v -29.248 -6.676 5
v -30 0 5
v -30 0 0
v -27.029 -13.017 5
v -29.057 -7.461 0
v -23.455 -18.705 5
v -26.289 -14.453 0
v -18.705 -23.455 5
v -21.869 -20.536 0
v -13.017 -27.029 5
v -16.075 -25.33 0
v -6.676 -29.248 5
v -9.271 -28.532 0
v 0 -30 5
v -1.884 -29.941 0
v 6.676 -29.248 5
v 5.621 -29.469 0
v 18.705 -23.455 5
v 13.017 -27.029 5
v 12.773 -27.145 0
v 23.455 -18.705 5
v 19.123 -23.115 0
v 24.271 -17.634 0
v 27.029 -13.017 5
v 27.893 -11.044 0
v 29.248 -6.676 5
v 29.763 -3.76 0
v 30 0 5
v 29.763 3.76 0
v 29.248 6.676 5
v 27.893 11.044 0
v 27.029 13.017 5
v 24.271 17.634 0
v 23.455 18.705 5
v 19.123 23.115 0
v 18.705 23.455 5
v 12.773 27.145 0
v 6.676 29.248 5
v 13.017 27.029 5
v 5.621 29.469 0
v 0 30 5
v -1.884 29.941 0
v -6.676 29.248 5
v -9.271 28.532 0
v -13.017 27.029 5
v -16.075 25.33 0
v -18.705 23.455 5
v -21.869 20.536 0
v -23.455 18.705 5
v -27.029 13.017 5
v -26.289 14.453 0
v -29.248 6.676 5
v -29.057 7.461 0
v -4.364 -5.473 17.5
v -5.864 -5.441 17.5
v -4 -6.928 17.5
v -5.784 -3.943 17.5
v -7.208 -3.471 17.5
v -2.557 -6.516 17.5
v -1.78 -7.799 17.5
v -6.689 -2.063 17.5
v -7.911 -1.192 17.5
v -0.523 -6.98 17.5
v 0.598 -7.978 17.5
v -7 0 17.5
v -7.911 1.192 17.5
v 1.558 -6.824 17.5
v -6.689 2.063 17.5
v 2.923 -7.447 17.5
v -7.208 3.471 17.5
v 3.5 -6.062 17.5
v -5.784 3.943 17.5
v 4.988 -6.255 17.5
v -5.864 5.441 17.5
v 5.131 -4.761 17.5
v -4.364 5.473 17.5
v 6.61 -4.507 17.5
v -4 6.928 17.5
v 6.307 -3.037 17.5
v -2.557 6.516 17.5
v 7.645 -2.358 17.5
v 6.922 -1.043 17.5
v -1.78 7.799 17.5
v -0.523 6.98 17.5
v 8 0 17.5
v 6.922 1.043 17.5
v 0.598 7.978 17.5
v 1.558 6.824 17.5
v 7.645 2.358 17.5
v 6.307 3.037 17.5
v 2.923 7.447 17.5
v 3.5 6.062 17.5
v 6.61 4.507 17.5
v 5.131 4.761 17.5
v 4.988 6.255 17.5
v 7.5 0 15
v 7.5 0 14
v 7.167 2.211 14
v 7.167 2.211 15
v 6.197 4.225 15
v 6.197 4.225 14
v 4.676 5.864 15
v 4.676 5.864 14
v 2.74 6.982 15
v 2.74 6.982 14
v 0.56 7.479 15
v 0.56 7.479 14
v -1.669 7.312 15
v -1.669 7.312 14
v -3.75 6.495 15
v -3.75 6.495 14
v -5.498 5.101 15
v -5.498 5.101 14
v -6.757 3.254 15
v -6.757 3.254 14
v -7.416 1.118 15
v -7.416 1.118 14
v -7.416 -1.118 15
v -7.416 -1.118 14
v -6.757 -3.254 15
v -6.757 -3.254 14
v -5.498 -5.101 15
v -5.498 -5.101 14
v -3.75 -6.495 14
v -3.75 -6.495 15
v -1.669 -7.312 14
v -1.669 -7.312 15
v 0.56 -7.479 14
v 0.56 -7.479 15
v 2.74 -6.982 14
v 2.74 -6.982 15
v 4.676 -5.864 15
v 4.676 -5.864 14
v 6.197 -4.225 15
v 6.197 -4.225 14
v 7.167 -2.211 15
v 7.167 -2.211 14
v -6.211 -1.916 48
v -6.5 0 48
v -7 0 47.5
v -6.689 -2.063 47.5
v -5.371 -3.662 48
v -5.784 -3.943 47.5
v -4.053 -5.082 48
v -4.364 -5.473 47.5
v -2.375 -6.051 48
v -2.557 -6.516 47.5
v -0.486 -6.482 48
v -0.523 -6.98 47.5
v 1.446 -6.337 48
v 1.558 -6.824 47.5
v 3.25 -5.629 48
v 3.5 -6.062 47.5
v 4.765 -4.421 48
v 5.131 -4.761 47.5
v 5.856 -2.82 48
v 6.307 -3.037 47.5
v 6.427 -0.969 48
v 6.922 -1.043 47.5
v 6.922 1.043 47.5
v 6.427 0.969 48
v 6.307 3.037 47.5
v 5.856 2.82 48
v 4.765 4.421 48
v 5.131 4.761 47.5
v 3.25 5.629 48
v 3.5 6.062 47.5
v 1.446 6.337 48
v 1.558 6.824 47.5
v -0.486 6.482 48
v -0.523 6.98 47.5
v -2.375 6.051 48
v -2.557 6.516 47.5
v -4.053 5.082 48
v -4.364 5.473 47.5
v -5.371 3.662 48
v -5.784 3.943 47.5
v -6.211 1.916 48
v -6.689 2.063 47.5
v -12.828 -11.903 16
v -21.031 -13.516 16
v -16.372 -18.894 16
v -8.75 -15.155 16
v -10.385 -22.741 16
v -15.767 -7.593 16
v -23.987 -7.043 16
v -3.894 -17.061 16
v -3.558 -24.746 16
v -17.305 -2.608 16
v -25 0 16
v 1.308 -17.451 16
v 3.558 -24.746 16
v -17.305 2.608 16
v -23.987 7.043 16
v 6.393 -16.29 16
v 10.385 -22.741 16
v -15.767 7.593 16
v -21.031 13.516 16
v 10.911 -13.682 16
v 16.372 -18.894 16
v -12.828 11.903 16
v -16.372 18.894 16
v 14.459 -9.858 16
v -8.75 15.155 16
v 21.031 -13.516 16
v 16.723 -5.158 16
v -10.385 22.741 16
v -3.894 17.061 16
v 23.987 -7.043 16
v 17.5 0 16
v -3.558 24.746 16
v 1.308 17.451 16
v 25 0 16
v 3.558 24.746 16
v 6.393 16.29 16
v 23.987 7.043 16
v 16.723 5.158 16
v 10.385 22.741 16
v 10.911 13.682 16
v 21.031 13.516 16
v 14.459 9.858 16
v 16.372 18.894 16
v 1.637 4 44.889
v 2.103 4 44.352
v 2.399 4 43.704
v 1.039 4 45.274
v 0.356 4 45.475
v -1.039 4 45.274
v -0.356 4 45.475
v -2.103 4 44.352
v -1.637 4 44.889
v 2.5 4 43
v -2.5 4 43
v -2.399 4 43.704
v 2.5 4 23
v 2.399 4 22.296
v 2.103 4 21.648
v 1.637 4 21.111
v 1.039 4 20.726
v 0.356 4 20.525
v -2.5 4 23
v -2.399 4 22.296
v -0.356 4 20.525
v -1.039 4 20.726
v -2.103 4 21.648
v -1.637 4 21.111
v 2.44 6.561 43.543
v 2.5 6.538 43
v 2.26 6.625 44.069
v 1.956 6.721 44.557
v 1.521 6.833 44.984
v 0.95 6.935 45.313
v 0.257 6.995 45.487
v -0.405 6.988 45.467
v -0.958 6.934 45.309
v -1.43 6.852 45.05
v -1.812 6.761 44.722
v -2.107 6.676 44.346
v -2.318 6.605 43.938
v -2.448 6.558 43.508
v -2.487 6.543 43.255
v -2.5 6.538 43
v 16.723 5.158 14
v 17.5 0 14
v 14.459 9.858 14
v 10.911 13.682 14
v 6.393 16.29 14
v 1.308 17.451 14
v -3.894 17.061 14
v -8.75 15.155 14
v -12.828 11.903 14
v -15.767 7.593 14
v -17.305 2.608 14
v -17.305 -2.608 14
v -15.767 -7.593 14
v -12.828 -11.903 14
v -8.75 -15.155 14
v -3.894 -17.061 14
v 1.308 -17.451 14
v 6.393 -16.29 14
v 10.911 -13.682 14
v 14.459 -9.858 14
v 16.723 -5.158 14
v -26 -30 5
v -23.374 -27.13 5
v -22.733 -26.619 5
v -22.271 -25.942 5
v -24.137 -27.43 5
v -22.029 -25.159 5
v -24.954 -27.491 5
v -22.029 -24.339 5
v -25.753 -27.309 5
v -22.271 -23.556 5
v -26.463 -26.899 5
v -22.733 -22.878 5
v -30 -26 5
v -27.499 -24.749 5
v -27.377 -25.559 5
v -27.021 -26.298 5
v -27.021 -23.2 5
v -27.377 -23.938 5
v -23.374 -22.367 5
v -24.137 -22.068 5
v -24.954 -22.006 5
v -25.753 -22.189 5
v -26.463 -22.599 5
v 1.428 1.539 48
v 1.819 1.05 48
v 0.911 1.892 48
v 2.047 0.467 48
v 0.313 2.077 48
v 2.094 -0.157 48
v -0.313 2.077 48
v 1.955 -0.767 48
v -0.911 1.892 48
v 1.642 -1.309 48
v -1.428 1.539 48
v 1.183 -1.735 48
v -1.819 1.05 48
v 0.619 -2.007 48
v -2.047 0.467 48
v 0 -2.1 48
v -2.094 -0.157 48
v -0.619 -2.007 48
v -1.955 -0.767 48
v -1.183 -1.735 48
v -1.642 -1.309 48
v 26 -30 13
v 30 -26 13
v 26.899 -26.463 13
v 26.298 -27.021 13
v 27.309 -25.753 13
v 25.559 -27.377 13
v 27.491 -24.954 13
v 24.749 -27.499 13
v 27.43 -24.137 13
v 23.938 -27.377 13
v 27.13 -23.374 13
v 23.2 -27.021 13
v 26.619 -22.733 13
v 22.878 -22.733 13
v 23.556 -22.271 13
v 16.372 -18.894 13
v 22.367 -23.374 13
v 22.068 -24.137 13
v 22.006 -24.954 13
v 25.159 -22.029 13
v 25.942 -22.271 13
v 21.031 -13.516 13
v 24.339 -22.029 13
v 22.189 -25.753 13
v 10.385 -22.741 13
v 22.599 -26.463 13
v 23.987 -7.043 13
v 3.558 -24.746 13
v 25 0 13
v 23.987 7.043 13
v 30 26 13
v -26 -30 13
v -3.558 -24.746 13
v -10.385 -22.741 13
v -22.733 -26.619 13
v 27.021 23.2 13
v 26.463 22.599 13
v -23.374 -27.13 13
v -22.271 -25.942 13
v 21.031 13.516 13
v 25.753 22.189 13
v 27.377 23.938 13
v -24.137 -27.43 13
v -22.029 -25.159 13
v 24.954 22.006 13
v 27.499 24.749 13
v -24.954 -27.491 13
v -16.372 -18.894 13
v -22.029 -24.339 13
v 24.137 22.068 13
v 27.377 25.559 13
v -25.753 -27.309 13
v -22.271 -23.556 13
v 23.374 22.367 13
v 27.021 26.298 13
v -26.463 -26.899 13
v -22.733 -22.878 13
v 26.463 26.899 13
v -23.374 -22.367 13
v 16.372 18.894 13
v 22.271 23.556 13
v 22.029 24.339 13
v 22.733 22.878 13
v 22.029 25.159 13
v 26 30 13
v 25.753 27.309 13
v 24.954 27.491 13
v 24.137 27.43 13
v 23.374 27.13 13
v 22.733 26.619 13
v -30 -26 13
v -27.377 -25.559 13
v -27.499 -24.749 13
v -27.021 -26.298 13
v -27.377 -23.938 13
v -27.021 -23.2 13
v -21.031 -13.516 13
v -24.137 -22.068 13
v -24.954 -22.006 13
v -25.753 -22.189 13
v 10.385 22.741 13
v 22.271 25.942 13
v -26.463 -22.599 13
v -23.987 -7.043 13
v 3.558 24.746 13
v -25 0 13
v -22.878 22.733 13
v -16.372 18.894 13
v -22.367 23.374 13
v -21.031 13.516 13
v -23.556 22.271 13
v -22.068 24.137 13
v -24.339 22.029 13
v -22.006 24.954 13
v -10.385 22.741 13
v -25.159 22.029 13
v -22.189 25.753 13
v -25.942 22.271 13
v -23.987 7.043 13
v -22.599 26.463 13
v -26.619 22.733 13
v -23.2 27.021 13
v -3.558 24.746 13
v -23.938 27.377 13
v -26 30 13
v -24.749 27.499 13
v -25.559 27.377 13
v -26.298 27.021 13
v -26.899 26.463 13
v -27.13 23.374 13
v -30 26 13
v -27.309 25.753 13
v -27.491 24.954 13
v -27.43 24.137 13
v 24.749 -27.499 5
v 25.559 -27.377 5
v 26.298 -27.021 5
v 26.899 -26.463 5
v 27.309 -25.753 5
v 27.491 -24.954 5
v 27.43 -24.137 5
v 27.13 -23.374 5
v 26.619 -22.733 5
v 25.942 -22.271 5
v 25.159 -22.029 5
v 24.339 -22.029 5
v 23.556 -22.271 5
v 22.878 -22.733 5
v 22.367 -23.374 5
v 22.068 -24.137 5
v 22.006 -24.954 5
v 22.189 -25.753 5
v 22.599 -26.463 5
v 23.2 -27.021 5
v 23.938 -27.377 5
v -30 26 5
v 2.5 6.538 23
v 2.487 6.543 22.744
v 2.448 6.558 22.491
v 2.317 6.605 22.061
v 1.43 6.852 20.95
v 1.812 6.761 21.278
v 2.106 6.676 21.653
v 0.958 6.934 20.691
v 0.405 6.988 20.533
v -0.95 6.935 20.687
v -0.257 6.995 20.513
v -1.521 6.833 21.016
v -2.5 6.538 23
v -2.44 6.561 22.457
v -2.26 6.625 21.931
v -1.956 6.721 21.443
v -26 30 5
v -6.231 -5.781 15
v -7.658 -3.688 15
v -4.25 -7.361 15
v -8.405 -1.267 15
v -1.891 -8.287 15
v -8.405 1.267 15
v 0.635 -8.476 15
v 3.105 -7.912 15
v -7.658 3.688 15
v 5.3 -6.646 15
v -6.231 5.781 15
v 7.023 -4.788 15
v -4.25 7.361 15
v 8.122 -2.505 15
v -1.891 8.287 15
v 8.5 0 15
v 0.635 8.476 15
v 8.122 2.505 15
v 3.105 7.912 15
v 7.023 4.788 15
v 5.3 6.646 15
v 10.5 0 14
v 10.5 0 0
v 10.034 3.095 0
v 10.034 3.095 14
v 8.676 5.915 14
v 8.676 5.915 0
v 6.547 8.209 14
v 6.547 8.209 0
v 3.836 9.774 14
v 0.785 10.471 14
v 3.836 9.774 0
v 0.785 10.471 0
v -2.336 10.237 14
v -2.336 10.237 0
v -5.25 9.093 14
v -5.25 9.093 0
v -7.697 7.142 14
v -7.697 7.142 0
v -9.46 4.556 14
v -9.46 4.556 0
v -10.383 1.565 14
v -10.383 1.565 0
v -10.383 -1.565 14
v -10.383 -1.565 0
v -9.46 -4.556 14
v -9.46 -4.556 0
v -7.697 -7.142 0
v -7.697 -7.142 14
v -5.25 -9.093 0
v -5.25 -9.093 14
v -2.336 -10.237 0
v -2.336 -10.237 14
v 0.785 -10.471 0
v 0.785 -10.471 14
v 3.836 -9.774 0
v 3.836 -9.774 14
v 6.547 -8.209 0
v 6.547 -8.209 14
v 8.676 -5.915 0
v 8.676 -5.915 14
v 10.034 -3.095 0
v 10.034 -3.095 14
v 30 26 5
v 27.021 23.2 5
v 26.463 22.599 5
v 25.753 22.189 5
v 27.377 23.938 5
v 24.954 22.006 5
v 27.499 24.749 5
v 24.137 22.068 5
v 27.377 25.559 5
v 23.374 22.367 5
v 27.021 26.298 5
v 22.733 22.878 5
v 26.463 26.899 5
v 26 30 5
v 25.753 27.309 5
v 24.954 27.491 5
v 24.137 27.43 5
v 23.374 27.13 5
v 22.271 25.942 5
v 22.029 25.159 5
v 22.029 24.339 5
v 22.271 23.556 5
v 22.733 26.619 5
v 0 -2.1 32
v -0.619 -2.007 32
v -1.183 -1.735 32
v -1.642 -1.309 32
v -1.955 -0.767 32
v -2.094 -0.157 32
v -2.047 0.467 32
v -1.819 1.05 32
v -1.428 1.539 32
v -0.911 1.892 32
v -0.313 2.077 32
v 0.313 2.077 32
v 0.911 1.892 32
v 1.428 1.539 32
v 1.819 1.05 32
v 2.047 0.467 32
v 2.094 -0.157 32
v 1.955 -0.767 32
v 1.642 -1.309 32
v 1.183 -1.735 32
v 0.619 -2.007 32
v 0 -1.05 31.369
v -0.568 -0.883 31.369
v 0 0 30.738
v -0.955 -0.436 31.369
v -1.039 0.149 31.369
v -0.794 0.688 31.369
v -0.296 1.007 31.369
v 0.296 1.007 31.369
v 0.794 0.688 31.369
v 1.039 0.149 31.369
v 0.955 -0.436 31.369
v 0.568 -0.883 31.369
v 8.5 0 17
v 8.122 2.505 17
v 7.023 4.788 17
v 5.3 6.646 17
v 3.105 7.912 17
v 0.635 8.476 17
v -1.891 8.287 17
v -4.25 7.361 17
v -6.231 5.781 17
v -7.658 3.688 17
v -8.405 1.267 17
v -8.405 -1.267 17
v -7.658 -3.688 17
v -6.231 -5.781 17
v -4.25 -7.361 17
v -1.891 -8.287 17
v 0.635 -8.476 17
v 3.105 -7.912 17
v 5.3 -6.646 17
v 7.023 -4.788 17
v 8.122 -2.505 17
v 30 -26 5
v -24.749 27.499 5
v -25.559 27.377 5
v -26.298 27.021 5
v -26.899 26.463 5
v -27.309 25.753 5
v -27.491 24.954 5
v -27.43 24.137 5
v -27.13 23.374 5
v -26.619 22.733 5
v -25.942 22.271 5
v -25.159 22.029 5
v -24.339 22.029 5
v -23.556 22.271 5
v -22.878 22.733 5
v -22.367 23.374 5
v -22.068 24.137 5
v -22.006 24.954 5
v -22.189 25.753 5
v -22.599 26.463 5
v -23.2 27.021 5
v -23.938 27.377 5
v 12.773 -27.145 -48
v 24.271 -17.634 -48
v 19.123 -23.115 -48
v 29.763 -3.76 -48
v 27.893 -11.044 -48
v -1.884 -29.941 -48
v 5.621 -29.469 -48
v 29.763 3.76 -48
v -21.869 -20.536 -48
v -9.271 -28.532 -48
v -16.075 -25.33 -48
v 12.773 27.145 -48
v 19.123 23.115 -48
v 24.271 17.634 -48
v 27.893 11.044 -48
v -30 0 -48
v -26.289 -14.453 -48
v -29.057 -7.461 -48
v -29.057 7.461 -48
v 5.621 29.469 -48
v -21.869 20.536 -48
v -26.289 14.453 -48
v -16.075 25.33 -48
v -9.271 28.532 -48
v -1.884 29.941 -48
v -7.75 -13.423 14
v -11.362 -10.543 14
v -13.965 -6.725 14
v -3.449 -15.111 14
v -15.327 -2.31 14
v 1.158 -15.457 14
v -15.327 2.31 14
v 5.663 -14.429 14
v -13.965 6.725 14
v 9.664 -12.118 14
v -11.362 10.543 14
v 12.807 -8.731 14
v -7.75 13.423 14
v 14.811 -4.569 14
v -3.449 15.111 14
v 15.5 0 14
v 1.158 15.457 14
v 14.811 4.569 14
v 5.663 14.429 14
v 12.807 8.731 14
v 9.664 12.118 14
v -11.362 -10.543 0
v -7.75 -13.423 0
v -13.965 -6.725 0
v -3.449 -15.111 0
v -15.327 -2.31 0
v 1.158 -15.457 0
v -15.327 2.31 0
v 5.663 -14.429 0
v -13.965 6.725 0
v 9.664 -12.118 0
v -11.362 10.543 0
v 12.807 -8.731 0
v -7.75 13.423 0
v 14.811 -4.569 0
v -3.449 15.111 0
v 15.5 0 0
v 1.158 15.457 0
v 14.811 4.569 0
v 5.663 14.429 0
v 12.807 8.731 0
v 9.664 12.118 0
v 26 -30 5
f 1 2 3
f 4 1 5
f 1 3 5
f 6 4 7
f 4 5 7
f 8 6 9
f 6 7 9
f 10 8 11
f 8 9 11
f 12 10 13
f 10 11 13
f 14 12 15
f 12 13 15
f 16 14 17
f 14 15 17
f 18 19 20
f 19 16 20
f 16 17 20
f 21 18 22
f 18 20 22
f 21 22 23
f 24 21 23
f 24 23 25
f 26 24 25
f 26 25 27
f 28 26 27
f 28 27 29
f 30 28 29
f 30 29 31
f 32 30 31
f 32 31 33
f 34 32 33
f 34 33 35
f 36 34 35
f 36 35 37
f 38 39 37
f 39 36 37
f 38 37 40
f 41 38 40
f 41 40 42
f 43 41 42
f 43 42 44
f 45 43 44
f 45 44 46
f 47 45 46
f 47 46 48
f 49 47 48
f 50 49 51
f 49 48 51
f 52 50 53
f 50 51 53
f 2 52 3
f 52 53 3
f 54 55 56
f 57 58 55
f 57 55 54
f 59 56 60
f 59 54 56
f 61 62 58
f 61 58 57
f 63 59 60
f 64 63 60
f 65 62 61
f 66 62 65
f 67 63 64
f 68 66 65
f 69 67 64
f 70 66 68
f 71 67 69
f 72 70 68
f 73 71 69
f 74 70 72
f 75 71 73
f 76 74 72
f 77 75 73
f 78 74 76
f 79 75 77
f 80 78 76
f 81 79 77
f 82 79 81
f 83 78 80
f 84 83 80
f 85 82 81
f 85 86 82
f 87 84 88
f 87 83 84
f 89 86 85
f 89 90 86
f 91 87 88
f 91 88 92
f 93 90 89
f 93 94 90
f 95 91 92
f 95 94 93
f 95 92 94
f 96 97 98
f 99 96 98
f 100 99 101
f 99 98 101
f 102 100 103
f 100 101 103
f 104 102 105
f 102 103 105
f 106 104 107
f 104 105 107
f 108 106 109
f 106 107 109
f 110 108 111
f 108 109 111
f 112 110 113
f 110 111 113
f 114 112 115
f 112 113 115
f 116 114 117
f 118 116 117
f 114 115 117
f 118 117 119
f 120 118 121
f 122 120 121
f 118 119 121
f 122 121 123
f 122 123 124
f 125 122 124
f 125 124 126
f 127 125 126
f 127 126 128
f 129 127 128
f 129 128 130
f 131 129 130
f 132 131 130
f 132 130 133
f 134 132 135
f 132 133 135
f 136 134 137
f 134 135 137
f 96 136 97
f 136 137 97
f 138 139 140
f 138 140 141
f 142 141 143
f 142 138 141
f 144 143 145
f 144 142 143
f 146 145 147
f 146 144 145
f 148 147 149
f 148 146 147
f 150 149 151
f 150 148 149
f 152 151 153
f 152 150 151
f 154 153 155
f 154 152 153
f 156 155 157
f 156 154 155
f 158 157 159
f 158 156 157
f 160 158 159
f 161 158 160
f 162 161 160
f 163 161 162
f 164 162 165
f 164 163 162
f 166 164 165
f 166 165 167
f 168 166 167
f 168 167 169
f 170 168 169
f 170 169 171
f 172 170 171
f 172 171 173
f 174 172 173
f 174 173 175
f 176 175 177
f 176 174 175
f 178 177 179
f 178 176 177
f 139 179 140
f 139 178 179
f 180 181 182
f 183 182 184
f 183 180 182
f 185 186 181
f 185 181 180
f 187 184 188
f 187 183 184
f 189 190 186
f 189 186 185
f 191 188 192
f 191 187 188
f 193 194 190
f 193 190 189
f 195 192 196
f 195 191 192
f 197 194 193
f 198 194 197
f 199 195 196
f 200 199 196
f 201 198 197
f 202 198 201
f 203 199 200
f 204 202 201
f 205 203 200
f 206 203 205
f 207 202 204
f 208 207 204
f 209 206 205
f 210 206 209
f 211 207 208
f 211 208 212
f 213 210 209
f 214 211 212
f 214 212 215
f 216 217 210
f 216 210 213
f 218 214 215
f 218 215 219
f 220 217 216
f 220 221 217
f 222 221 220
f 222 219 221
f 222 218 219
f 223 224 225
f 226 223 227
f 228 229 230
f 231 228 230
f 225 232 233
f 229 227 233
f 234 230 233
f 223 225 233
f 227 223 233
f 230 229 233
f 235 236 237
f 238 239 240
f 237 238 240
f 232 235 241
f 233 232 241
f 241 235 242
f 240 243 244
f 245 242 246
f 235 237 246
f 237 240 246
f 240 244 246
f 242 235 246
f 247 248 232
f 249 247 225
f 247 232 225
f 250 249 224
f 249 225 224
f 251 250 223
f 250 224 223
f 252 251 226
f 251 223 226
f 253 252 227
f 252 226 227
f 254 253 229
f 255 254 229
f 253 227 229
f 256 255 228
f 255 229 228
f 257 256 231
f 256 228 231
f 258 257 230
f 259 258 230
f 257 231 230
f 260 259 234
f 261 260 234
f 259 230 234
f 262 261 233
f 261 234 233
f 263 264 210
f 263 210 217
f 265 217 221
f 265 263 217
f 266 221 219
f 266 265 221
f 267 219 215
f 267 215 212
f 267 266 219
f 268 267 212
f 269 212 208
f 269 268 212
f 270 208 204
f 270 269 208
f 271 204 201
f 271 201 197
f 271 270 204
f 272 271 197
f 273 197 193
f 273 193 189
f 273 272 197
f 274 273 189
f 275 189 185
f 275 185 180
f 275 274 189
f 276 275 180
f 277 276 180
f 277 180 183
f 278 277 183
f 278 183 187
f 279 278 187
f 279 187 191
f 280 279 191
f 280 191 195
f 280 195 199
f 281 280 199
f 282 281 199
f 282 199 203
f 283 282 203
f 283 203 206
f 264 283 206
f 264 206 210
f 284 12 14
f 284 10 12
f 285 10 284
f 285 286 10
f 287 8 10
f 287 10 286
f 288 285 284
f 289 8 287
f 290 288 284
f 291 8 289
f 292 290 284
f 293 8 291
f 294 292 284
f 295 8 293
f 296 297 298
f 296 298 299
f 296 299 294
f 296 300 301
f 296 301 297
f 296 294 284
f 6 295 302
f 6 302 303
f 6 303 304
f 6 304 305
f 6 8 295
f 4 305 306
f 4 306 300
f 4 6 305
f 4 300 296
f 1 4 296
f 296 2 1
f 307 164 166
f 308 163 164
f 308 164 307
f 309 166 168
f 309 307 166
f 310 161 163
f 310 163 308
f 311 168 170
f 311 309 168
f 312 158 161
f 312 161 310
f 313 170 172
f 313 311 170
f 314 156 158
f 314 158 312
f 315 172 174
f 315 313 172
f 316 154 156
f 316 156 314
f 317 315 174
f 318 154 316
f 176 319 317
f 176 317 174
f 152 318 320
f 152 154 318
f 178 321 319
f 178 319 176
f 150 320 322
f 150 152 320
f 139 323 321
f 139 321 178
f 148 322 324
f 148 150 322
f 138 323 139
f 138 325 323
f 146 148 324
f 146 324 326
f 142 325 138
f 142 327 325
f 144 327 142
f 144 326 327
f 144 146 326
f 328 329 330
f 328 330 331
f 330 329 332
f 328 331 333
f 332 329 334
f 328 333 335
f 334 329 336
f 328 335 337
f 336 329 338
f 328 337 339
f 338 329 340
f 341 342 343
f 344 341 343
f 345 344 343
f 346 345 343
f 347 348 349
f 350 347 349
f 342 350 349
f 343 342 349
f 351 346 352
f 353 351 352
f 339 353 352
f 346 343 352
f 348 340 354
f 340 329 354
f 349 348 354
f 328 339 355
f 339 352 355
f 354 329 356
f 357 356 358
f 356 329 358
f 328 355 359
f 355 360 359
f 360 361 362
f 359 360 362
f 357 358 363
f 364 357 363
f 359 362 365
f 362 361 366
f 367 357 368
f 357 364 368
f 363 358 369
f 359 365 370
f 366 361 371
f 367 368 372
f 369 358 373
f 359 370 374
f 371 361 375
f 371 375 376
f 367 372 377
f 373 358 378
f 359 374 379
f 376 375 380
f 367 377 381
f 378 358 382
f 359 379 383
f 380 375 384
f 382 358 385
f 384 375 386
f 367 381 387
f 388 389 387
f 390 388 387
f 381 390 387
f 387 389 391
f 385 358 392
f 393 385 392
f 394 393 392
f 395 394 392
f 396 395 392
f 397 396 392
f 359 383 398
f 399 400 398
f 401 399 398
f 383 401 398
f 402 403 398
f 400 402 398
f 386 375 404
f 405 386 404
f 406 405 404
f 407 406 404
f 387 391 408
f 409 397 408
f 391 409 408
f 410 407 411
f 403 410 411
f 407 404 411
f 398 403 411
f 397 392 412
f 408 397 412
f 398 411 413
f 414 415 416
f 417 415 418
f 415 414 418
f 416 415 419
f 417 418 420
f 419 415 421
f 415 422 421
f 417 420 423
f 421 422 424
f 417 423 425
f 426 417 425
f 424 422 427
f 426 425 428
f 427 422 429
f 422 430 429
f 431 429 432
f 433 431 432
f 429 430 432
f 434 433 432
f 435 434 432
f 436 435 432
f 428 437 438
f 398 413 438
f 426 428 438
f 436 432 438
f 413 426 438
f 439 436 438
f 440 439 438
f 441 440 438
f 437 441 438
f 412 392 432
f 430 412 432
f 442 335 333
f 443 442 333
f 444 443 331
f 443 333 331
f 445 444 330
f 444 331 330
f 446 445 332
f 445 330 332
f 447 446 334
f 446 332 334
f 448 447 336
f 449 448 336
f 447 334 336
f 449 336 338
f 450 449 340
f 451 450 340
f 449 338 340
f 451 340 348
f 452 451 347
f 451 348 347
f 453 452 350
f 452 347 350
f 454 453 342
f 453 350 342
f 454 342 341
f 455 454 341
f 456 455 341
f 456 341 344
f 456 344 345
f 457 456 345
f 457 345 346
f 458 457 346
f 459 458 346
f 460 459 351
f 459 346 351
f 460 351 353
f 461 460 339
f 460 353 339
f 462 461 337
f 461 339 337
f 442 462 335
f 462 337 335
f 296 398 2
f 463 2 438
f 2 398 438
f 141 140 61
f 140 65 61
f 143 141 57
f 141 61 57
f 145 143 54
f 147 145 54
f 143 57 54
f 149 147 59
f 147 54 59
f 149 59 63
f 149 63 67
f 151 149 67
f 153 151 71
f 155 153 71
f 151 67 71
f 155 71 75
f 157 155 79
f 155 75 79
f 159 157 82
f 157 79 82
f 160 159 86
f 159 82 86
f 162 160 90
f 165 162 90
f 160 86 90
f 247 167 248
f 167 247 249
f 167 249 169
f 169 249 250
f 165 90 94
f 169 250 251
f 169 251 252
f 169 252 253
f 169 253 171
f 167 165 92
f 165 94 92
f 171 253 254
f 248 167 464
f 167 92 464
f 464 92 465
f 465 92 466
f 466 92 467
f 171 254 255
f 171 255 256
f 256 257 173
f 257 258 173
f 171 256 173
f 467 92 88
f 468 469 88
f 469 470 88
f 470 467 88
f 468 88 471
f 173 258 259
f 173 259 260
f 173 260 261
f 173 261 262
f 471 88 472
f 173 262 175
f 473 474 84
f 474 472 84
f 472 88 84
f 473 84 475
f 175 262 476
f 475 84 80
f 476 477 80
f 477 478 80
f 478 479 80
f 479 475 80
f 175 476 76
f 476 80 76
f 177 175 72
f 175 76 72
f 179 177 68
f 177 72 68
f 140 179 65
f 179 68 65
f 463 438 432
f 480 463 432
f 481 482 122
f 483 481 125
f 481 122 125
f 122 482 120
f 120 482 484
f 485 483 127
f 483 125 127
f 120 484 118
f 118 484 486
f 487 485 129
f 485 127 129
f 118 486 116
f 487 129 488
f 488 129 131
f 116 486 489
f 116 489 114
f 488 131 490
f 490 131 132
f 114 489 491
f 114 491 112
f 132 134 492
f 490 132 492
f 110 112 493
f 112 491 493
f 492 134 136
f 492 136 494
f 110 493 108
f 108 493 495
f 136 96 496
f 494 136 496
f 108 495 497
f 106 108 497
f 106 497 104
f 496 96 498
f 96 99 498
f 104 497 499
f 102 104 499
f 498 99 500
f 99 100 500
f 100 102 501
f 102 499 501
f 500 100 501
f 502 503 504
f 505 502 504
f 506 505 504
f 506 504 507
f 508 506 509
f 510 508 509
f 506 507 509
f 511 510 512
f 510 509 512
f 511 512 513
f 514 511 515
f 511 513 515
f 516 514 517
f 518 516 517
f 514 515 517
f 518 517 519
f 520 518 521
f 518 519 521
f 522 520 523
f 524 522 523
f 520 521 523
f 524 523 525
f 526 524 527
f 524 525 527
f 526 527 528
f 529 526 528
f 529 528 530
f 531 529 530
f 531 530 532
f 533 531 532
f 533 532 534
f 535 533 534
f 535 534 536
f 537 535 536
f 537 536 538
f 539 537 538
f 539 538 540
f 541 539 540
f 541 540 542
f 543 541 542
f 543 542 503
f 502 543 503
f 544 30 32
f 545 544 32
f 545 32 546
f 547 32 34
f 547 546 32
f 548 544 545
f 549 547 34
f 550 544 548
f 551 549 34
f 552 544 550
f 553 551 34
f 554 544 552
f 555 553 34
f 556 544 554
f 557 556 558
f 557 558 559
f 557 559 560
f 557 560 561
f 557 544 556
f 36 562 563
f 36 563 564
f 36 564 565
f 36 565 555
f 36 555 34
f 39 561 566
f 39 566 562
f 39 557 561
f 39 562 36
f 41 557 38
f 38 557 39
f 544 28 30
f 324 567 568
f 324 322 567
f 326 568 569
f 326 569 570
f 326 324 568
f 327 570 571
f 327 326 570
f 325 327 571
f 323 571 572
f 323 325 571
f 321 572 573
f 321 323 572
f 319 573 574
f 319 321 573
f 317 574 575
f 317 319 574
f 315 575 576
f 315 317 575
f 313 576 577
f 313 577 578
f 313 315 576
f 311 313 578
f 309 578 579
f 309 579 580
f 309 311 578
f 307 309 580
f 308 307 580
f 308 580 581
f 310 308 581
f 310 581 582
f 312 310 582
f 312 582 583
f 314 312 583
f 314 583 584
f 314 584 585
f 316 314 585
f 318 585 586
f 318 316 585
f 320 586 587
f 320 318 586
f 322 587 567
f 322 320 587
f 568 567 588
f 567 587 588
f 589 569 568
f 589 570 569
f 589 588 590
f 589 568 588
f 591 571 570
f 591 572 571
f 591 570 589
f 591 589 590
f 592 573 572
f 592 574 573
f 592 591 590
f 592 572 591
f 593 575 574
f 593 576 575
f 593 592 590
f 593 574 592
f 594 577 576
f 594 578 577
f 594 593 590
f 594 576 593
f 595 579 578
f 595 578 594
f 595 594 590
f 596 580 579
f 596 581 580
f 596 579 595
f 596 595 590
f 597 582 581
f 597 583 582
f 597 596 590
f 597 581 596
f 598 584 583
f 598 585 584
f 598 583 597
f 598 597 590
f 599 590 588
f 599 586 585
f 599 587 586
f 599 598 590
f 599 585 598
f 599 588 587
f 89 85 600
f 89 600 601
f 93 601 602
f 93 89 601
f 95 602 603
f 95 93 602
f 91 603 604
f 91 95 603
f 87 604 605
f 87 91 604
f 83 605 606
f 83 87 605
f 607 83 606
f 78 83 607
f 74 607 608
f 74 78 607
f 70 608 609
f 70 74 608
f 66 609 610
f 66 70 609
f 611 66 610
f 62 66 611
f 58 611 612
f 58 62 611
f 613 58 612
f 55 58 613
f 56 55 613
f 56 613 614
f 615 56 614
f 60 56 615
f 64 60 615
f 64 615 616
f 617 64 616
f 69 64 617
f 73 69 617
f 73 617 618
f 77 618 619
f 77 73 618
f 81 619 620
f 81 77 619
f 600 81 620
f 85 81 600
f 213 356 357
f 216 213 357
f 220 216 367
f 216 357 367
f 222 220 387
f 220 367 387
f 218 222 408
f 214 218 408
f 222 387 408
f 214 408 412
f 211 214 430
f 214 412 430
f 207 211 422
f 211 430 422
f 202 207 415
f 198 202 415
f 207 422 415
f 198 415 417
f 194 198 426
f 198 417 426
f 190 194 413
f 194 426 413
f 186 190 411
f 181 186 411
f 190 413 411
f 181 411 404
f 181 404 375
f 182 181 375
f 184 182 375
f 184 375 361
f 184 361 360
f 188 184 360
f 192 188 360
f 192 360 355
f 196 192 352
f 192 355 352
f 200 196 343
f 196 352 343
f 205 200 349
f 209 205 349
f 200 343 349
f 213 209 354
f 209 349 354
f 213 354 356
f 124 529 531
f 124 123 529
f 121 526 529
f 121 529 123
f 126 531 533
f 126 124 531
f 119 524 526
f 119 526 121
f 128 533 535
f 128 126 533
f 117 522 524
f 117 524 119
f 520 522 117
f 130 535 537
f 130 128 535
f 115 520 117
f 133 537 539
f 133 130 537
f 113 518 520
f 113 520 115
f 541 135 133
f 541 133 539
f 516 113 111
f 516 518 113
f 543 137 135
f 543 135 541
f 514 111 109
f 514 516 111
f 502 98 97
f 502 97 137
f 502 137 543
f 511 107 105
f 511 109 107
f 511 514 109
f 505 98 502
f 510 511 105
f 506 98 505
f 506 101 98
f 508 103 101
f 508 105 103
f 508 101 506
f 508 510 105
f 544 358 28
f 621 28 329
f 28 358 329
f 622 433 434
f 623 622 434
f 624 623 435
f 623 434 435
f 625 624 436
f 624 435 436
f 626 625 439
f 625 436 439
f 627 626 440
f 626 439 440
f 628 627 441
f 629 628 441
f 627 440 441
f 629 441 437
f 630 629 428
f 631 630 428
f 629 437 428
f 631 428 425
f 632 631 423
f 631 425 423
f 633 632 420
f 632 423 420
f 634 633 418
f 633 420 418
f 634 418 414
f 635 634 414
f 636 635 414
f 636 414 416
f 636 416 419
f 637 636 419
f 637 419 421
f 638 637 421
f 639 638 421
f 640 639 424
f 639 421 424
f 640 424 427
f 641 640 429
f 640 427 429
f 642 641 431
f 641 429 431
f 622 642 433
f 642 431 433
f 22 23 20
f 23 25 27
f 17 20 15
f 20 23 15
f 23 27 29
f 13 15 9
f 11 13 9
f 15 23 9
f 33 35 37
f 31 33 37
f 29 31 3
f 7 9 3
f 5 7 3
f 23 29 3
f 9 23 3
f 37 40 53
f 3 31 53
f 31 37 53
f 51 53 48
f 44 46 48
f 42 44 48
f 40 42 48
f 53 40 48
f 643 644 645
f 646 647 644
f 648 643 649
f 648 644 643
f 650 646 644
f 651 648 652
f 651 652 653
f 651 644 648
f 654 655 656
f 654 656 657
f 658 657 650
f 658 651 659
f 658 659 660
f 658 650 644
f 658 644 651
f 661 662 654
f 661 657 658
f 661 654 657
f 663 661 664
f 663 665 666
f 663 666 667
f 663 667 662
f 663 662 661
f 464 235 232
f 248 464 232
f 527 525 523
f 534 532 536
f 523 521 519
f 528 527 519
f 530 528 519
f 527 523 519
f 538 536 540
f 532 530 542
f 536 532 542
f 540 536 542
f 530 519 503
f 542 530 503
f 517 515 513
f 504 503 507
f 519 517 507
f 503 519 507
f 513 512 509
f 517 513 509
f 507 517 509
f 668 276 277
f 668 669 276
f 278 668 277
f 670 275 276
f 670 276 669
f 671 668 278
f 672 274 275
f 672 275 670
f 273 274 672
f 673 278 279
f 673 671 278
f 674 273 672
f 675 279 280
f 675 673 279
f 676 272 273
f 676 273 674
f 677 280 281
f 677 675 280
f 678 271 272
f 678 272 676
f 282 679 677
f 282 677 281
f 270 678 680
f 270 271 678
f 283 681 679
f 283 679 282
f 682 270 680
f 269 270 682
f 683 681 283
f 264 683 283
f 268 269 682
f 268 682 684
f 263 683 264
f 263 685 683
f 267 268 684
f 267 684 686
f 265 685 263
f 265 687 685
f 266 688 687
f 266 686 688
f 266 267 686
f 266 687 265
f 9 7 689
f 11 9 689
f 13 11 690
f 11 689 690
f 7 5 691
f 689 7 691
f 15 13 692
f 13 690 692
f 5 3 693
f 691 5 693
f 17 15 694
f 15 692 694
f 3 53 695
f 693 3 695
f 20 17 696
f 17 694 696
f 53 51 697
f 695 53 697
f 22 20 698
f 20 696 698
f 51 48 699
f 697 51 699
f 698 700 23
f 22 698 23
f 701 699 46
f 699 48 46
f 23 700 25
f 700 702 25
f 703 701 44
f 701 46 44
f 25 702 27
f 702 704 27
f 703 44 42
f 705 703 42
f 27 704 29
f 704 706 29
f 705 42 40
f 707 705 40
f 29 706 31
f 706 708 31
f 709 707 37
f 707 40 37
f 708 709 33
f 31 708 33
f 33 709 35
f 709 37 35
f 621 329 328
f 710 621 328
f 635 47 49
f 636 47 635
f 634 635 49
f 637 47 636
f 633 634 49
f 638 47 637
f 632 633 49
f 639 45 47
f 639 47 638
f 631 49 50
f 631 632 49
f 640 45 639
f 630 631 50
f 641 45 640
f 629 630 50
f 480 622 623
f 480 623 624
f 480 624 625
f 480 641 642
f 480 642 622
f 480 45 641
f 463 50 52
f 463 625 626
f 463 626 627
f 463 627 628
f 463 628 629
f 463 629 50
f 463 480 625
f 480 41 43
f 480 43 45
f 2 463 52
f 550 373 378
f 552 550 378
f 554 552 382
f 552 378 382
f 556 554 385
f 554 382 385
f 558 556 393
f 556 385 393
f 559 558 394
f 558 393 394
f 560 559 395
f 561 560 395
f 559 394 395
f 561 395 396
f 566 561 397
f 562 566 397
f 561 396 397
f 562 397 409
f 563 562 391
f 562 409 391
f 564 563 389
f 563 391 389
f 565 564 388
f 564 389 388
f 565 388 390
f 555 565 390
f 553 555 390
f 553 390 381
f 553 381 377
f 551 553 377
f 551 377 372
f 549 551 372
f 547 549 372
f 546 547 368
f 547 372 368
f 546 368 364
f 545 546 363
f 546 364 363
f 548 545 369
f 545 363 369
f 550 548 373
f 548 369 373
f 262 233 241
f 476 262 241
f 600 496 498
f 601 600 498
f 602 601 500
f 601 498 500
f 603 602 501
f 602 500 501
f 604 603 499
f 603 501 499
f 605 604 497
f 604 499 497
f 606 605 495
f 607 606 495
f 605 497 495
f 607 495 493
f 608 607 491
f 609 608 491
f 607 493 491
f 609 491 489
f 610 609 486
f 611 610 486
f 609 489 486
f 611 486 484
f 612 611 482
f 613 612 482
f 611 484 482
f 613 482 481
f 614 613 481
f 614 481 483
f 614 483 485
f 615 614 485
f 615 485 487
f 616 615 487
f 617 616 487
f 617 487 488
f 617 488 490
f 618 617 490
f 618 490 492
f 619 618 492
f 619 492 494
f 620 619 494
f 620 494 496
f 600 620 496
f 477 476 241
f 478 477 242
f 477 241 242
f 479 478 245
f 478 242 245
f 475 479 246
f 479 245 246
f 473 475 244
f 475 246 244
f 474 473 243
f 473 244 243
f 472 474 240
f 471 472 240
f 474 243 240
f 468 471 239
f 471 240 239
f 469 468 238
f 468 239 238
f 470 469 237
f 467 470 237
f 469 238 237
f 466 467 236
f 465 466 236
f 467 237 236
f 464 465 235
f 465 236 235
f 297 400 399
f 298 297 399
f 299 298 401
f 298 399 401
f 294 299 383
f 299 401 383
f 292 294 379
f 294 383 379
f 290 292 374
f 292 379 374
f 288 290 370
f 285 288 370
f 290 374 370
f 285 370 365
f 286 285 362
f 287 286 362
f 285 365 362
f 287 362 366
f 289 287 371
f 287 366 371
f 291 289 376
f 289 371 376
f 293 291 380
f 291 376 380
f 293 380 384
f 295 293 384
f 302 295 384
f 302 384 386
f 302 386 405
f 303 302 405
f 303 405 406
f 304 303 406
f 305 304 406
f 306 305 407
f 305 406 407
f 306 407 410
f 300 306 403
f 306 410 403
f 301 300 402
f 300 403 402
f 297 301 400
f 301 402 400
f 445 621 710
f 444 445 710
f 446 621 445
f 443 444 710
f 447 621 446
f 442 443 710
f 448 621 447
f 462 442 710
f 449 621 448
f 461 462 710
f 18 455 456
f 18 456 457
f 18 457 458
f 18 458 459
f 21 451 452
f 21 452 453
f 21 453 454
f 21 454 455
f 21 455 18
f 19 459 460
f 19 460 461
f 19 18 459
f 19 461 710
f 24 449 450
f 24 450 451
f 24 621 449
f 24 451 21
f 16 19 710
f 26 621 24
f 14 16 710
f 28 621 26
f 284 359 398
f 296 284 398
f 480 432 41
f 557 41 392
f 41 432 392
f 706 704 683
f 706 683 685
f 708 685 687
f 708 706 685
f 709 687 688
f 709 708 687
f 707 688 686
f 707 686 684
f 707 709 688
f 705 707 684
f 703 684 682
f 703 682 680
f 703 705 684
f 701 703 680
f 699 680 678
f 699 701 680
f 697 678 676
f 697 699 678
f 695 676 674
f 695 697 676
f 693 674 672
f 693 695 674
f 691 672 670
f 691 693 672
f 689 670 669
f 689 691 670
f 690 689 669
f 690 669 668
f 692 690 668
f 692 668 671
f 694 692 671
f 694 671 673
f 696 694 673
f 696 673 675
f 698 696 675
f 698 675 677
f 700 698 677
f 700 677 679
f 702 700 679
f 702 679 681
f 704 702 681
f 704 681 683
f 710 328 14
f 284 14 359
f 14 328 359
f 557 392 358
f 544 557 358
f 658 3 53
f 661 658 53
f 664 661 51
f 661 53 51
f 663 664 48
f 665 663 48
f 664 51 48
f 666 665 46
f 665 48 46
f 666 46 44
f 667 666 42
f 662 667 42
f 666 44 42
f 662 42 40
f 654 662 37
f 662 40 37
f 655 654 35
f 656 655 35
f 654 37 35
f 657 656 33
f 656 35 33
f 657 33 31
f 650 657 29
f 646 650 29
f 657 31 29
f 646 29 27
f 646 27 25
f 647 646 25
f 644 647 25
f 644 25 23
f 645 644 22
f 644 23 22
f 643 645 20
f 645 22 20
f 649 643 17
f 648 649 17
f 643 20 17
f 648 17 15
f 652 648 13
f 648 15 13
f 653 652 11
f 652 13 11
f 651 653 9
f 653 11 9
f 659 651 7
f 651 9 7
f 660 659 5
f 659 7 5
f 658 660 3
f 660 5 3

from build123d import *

# Parameters (mm, degrees)
SKETCH_1_R               = 30
EXTRUDE_1_DEPTH          = 13
SKETCH_2_R               = 30
EXTRUDE_2_DEPTH          = 48
SKETCH_3_R               = 25
SKETCH_3_R_2             = 17.5
EXTRUDE_3_DEPTH          = 3
CUT_EXTRUDE_START        = -13
SKETCH_4_R               = 17.5
CUT_EXTRUDE_1_DEPTH      = 13
SKETCH_6_R               = 17.5
SKETCH_6_R_2             = 15.5
EXTRUDE_4_DEPTH          = 14
SKETCH_7_R               = 10.5
EXTRUDE_5_DEPTH          = 14
SKETCH_8_R               = 8.5
EXTRUDE_6_DEPTH          = 3.5
SKETCH_9_R               = 7
EXTRUDE_7_DEPTH          = 30.5
CHAMFER_1_SIZE           = 0.5
SKETCH_10_R              = 15.5
SKETCH_10_R_2            = 7.5
CUT_EXTRUDE_7_DEPTH      = 1
CUT_EXTRUDE_8_DEPTH      = 10
EXTRUDE_8_DEPTH          = 8
SKETCH_19_R              = 2.75
CUT_EXTRUDE_9_DEPTH      = 8
PATTERN_CIRCULAR_1_COUNT = 4
CUT_EXTRUDE_START_2      = -8
SKETCH_21_R              = 15.5
SKETCH_21_R_2            = 10.5
CUT_EXTRUDE_11_DEPTH     = 8


with BuildPart() as part:
    # 草图1 → 凸台-拉伸1 (new body)
    with BuildSketch(Plane.XY):
        with Locations(Location((0, 0, 0), (0, 0, 180))):
            Circle(SKETCH_1_R)
    extrude(amount=EXTRUDE_1_DEPTH)

    # 草图3 → 凸台-拉伸3 (add)
    with BuildSketch(Plane.XY.offset(13)):
        Circle(SKETCH_3_R)
        Circle(SKETCH_3_R_2, mode=Mode.SUBTRACT)
    extrude(amount=EXTRUDE_3_DEPTH)

    # 草图4 → 切除-拉伸1 (cut)
    with BuildSketch(Plane.XY.offset(13).offset(CUT_EXTRUDE_START)):
        Circle(SKETCH_4_R)
    extrude(amount=CUT_EXTRUDE_1_DEPTH, mode=Mode.SUBTRACT)



with BuildPart() as body_2:
    # 草图2 → 凸台-拉伸2 (new body)
    with BuildSketch(Plane(origin=(0, 0, 0), x_dir=(-1, 0, 0), z_dir=(0, 0, -1))):
        Circle(SKETCH_2_R)
    extrude(amount=EXTRUDE_2_DEPTH)


with BuildPart() as body_3:
    # 草图6 → 凸台-拉伸4 (new body)
    with BuildSketch(Plane.XY):
        Circle(SKETCH_6_R)
        Circle(SKETCH_6_R_2, mode=Mode.SUBTRACT)
    extrude(amount=EXTRUDE_4_DEPTH)


with BuildPart() as body_4:
    # 草图7 → 凸台-拉伸5 (new body)
    with BuildSketch(Plane.XY):
        Circle(SKETCH_7_R)
    extrude(amount=EXTRUDE_5_DEPTH)

    # 草图8 → 凸台-拉伸6 (add)
    with BuildSketch(Plane.XY.offset(14)):
        Circle(SKETCH_8_R)
    extrude(amount=EXTRUDE_6_DEPTH)

    # 草图9 → 凸台-拉伸7 (add)
    with BuildSketch(Plane.XY.offset(17.5)):
        with Locations(Location((0, 0, 0), (0, 0, 180))):
            Circle(SKETCH_9_R)
    extrude(amount=EXTRUDE_7_DEPTH)

    # 倒角1
    chamfer_1_edges = [body_4.edges().sort_by_distance(p)[0] for p in [
        (7, 0, 48),
        (-8.5, 0, 17.5),
    ]]
    chamfer(chamfer_1_edges, length=CHAMFER_1_SIZE)

    # 草图10 → 切除-拉伸7 (cut)
    with BuildSketch(Plane.XY.offset(14)):
        Circle(SKETCH_10_R)
        Circle(SKETCH_10_R_2, mode=Mode.SUBTRACT)
    extrude(amount=CUT_EXTRUDE_7_DEPTH, mode=Mode.SUBTRACT)

    # 草图11 → 切除-拉伸8 (cut)
    with BuildSketch(Plane(origin=(0, 4, 0), x_dir=(1, 0, 0), z_dir=(0, 1, 0))):
        with BuildLine():
            Line((2.5, -23), (2.5, -43))
            ThreePointArc((2.5, -43), (0, -45.5), (-2.5, -43))
            Line((-2.5, -43), (-2.5, -23))
            ThreePointArc((-2.5, -23), (0, -20.5), (2.5, -23))
        make_face()
    extrude(amount=CUT_EXTRUDE_8_DEPTH, mode=Mode.SUBTRACT)

    # 草图12 → M5 螺纹孔1 (revolve, cut)
    with BuildSketch(Plane(origin=(0, 0, 48), x_dir=(0, -1, 0), z_dir=(1, 0, 0))):
        Polygon((0, 0), (0, 17.2618073), (2.1, 16), (2.1, 0), align=None)
    revolve(axis=Axis((0, 0, 54.35), (0, 0, -1)), mode=Mode.SUBTRACT)


with BuildPart() as part_1:
    add(part.part)

    add(body_3.part)  # 凸台-拉伸8 merges body 3

    add(body_4.part)  # 凸台-拉伸8 merges body 4
    # 草图18 → 凸台-拉伸8 (add)
    with BuildSketch(Plane.XY.offset(13)):
        Polygon((26, 30), (30, 26), (30, -26), (26, -30), (-26, -30), (-30, -26), (-30, 26), (-26, 30), align=None)
    extrude(amount=-EXTRUDE_8_DEPTH)

    # 草图19 → 切除-拉伸9 (cut)
    with BuildSketch(Plane.XY.offset(13)):
        with Locations((24.748737342, 24.748737342)):
            Circle(SKETCH_19_R)
    cut_extrude_9 = extrude(amount=-CUT_EXTRUDE_9_DEPTH, mode=Mode.SUBTRACT)

    # 阵列(圆周)1: 切除-拉伸9 ×4 about axis
    pattern_circular_1_axis = Axis((0, 0, 0), (0, 0, 1))
    for i in range(1, PATTERN_CIRCULAR_1_COUNT):
        add(cut_extrude_9.rotate(pattern_circular_1_axis, i * 360 / PATTERN_CIRCULAR_1_COUNT), mode=Mode.SUBTRACT)

    # 草图21 → 切除-拉伸11 (cut)
    with BuildSketch(Plane.XY.offset(13).offset(CUT_EXTRUDE_START_2)):
        Circle(SKETCH_21_R)
        Circle(SKETCH_21_R_2, mode=Mode.SUBTRACT)
    extrude(amount=CUT_EXTRUDE_11_DEPTH, mode=Mode.SUBTRACT)


with BuildPart() as cut_extrude_11_piece_1:
    # of the separate pieces the step leaves, piece 1, a body of its own (cut_extrude_11_pieces)
    add(part_1.part.solids().sort_by_distance((15.5, 0, 14))[0])


with BuildPart() as cut_extrude_11_piece_2:
    # of the separate pieces the step leaves, piece 2, a body of its own (cut_extrude_11_pieces)
    add(part_1.part.solids().sort_by_distance((10.5, 0, 14))[0])


solid = Compound([body_2.part, cut_extrude_11_piece_1.part, cut_extrude_11_piece_2.part])
